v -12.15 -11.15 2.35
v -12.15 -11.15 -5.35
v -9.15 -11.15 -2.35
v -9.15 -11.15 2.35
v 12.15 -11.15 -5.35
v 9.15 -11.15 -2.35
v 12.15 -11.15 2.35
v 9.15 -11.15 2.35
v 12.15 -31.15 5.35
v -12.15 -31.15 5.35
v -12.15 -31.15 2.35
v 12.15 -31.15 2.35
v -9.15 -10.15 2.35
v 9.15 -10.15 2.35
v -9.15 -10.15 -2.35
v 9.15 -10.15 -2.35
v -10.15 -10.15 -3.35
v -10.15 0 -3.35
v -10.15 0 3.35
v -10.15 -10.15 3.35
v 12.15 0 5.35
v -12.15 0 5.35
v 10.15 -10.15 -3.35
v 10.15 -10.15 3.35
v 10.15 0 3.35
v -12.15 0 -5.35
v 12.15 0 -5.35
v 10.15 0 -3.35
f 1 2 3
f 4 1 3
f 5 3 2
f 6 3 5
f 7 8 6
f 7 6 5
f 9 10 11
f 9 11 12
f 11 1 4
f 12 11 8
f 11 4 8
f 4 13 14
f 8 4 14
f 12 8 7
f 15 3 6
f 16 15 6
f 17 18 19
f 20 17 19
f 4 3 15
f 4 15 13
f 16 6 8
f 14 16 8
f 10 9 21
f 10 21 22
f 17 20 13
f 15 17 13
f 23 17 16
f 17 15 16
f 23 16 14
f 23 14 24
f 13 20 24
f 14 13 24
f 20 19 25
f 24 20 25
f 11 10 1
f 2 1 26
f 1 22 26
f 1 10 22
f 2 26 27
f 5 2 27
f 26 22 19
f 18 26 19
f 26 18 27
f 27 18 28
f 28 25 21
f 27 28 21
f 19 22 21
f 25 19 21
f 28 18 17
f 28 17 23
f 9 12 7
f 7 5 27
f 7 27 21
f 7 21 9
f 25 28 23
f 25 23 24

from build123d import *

# Parameters (mm, degrees)
F0_W     = 24.3
F0_H     = 10.7
F0_W_2   = 20.3
F0_H_2   = 6.7
F1_DEPTH = 11.15
F2_W     = 20.3
F2_H     = 6.7
F2_W_2   = 18.3
F2_H_2   = 4.7
F3_DEPTH = 1
F5_DEPTH = 20


with BuildPart() as f1:
    # F0 (on Front) → F1 (new body)
    with BuildSketch(Plane.XZ):
        Rectangle(F0_W, F0_H)
        Rectangle(F0_W_2, F0_H_2, mode=Mode.SUBTRACT)
    extrude(amount=F1_DEPTH)

    # F2 (on face) → F3 (join)
    with BuildSketch(Plane.XZ.offset(11.15)):
        Rectangle(F2_W, F2_H)
        Rectangle(F2_W_2, F2_H_2, mode=Mode.SUBTRACT)
    extrude(amount=-F3_DEPTH)

    # F4 (on face) → F5 (join)
    with BuildSketch(Plane.XZ.offset(11.15)):
        Polygon((12.15, 2.35), (12.15, 5.35), (-12.15, 5.35), (-12.15, 2.35), (-9.15, 2.35), (9.15, 2.35), align=None)
    extrude(amount=F5_DEPTH)


solid = f1.part
